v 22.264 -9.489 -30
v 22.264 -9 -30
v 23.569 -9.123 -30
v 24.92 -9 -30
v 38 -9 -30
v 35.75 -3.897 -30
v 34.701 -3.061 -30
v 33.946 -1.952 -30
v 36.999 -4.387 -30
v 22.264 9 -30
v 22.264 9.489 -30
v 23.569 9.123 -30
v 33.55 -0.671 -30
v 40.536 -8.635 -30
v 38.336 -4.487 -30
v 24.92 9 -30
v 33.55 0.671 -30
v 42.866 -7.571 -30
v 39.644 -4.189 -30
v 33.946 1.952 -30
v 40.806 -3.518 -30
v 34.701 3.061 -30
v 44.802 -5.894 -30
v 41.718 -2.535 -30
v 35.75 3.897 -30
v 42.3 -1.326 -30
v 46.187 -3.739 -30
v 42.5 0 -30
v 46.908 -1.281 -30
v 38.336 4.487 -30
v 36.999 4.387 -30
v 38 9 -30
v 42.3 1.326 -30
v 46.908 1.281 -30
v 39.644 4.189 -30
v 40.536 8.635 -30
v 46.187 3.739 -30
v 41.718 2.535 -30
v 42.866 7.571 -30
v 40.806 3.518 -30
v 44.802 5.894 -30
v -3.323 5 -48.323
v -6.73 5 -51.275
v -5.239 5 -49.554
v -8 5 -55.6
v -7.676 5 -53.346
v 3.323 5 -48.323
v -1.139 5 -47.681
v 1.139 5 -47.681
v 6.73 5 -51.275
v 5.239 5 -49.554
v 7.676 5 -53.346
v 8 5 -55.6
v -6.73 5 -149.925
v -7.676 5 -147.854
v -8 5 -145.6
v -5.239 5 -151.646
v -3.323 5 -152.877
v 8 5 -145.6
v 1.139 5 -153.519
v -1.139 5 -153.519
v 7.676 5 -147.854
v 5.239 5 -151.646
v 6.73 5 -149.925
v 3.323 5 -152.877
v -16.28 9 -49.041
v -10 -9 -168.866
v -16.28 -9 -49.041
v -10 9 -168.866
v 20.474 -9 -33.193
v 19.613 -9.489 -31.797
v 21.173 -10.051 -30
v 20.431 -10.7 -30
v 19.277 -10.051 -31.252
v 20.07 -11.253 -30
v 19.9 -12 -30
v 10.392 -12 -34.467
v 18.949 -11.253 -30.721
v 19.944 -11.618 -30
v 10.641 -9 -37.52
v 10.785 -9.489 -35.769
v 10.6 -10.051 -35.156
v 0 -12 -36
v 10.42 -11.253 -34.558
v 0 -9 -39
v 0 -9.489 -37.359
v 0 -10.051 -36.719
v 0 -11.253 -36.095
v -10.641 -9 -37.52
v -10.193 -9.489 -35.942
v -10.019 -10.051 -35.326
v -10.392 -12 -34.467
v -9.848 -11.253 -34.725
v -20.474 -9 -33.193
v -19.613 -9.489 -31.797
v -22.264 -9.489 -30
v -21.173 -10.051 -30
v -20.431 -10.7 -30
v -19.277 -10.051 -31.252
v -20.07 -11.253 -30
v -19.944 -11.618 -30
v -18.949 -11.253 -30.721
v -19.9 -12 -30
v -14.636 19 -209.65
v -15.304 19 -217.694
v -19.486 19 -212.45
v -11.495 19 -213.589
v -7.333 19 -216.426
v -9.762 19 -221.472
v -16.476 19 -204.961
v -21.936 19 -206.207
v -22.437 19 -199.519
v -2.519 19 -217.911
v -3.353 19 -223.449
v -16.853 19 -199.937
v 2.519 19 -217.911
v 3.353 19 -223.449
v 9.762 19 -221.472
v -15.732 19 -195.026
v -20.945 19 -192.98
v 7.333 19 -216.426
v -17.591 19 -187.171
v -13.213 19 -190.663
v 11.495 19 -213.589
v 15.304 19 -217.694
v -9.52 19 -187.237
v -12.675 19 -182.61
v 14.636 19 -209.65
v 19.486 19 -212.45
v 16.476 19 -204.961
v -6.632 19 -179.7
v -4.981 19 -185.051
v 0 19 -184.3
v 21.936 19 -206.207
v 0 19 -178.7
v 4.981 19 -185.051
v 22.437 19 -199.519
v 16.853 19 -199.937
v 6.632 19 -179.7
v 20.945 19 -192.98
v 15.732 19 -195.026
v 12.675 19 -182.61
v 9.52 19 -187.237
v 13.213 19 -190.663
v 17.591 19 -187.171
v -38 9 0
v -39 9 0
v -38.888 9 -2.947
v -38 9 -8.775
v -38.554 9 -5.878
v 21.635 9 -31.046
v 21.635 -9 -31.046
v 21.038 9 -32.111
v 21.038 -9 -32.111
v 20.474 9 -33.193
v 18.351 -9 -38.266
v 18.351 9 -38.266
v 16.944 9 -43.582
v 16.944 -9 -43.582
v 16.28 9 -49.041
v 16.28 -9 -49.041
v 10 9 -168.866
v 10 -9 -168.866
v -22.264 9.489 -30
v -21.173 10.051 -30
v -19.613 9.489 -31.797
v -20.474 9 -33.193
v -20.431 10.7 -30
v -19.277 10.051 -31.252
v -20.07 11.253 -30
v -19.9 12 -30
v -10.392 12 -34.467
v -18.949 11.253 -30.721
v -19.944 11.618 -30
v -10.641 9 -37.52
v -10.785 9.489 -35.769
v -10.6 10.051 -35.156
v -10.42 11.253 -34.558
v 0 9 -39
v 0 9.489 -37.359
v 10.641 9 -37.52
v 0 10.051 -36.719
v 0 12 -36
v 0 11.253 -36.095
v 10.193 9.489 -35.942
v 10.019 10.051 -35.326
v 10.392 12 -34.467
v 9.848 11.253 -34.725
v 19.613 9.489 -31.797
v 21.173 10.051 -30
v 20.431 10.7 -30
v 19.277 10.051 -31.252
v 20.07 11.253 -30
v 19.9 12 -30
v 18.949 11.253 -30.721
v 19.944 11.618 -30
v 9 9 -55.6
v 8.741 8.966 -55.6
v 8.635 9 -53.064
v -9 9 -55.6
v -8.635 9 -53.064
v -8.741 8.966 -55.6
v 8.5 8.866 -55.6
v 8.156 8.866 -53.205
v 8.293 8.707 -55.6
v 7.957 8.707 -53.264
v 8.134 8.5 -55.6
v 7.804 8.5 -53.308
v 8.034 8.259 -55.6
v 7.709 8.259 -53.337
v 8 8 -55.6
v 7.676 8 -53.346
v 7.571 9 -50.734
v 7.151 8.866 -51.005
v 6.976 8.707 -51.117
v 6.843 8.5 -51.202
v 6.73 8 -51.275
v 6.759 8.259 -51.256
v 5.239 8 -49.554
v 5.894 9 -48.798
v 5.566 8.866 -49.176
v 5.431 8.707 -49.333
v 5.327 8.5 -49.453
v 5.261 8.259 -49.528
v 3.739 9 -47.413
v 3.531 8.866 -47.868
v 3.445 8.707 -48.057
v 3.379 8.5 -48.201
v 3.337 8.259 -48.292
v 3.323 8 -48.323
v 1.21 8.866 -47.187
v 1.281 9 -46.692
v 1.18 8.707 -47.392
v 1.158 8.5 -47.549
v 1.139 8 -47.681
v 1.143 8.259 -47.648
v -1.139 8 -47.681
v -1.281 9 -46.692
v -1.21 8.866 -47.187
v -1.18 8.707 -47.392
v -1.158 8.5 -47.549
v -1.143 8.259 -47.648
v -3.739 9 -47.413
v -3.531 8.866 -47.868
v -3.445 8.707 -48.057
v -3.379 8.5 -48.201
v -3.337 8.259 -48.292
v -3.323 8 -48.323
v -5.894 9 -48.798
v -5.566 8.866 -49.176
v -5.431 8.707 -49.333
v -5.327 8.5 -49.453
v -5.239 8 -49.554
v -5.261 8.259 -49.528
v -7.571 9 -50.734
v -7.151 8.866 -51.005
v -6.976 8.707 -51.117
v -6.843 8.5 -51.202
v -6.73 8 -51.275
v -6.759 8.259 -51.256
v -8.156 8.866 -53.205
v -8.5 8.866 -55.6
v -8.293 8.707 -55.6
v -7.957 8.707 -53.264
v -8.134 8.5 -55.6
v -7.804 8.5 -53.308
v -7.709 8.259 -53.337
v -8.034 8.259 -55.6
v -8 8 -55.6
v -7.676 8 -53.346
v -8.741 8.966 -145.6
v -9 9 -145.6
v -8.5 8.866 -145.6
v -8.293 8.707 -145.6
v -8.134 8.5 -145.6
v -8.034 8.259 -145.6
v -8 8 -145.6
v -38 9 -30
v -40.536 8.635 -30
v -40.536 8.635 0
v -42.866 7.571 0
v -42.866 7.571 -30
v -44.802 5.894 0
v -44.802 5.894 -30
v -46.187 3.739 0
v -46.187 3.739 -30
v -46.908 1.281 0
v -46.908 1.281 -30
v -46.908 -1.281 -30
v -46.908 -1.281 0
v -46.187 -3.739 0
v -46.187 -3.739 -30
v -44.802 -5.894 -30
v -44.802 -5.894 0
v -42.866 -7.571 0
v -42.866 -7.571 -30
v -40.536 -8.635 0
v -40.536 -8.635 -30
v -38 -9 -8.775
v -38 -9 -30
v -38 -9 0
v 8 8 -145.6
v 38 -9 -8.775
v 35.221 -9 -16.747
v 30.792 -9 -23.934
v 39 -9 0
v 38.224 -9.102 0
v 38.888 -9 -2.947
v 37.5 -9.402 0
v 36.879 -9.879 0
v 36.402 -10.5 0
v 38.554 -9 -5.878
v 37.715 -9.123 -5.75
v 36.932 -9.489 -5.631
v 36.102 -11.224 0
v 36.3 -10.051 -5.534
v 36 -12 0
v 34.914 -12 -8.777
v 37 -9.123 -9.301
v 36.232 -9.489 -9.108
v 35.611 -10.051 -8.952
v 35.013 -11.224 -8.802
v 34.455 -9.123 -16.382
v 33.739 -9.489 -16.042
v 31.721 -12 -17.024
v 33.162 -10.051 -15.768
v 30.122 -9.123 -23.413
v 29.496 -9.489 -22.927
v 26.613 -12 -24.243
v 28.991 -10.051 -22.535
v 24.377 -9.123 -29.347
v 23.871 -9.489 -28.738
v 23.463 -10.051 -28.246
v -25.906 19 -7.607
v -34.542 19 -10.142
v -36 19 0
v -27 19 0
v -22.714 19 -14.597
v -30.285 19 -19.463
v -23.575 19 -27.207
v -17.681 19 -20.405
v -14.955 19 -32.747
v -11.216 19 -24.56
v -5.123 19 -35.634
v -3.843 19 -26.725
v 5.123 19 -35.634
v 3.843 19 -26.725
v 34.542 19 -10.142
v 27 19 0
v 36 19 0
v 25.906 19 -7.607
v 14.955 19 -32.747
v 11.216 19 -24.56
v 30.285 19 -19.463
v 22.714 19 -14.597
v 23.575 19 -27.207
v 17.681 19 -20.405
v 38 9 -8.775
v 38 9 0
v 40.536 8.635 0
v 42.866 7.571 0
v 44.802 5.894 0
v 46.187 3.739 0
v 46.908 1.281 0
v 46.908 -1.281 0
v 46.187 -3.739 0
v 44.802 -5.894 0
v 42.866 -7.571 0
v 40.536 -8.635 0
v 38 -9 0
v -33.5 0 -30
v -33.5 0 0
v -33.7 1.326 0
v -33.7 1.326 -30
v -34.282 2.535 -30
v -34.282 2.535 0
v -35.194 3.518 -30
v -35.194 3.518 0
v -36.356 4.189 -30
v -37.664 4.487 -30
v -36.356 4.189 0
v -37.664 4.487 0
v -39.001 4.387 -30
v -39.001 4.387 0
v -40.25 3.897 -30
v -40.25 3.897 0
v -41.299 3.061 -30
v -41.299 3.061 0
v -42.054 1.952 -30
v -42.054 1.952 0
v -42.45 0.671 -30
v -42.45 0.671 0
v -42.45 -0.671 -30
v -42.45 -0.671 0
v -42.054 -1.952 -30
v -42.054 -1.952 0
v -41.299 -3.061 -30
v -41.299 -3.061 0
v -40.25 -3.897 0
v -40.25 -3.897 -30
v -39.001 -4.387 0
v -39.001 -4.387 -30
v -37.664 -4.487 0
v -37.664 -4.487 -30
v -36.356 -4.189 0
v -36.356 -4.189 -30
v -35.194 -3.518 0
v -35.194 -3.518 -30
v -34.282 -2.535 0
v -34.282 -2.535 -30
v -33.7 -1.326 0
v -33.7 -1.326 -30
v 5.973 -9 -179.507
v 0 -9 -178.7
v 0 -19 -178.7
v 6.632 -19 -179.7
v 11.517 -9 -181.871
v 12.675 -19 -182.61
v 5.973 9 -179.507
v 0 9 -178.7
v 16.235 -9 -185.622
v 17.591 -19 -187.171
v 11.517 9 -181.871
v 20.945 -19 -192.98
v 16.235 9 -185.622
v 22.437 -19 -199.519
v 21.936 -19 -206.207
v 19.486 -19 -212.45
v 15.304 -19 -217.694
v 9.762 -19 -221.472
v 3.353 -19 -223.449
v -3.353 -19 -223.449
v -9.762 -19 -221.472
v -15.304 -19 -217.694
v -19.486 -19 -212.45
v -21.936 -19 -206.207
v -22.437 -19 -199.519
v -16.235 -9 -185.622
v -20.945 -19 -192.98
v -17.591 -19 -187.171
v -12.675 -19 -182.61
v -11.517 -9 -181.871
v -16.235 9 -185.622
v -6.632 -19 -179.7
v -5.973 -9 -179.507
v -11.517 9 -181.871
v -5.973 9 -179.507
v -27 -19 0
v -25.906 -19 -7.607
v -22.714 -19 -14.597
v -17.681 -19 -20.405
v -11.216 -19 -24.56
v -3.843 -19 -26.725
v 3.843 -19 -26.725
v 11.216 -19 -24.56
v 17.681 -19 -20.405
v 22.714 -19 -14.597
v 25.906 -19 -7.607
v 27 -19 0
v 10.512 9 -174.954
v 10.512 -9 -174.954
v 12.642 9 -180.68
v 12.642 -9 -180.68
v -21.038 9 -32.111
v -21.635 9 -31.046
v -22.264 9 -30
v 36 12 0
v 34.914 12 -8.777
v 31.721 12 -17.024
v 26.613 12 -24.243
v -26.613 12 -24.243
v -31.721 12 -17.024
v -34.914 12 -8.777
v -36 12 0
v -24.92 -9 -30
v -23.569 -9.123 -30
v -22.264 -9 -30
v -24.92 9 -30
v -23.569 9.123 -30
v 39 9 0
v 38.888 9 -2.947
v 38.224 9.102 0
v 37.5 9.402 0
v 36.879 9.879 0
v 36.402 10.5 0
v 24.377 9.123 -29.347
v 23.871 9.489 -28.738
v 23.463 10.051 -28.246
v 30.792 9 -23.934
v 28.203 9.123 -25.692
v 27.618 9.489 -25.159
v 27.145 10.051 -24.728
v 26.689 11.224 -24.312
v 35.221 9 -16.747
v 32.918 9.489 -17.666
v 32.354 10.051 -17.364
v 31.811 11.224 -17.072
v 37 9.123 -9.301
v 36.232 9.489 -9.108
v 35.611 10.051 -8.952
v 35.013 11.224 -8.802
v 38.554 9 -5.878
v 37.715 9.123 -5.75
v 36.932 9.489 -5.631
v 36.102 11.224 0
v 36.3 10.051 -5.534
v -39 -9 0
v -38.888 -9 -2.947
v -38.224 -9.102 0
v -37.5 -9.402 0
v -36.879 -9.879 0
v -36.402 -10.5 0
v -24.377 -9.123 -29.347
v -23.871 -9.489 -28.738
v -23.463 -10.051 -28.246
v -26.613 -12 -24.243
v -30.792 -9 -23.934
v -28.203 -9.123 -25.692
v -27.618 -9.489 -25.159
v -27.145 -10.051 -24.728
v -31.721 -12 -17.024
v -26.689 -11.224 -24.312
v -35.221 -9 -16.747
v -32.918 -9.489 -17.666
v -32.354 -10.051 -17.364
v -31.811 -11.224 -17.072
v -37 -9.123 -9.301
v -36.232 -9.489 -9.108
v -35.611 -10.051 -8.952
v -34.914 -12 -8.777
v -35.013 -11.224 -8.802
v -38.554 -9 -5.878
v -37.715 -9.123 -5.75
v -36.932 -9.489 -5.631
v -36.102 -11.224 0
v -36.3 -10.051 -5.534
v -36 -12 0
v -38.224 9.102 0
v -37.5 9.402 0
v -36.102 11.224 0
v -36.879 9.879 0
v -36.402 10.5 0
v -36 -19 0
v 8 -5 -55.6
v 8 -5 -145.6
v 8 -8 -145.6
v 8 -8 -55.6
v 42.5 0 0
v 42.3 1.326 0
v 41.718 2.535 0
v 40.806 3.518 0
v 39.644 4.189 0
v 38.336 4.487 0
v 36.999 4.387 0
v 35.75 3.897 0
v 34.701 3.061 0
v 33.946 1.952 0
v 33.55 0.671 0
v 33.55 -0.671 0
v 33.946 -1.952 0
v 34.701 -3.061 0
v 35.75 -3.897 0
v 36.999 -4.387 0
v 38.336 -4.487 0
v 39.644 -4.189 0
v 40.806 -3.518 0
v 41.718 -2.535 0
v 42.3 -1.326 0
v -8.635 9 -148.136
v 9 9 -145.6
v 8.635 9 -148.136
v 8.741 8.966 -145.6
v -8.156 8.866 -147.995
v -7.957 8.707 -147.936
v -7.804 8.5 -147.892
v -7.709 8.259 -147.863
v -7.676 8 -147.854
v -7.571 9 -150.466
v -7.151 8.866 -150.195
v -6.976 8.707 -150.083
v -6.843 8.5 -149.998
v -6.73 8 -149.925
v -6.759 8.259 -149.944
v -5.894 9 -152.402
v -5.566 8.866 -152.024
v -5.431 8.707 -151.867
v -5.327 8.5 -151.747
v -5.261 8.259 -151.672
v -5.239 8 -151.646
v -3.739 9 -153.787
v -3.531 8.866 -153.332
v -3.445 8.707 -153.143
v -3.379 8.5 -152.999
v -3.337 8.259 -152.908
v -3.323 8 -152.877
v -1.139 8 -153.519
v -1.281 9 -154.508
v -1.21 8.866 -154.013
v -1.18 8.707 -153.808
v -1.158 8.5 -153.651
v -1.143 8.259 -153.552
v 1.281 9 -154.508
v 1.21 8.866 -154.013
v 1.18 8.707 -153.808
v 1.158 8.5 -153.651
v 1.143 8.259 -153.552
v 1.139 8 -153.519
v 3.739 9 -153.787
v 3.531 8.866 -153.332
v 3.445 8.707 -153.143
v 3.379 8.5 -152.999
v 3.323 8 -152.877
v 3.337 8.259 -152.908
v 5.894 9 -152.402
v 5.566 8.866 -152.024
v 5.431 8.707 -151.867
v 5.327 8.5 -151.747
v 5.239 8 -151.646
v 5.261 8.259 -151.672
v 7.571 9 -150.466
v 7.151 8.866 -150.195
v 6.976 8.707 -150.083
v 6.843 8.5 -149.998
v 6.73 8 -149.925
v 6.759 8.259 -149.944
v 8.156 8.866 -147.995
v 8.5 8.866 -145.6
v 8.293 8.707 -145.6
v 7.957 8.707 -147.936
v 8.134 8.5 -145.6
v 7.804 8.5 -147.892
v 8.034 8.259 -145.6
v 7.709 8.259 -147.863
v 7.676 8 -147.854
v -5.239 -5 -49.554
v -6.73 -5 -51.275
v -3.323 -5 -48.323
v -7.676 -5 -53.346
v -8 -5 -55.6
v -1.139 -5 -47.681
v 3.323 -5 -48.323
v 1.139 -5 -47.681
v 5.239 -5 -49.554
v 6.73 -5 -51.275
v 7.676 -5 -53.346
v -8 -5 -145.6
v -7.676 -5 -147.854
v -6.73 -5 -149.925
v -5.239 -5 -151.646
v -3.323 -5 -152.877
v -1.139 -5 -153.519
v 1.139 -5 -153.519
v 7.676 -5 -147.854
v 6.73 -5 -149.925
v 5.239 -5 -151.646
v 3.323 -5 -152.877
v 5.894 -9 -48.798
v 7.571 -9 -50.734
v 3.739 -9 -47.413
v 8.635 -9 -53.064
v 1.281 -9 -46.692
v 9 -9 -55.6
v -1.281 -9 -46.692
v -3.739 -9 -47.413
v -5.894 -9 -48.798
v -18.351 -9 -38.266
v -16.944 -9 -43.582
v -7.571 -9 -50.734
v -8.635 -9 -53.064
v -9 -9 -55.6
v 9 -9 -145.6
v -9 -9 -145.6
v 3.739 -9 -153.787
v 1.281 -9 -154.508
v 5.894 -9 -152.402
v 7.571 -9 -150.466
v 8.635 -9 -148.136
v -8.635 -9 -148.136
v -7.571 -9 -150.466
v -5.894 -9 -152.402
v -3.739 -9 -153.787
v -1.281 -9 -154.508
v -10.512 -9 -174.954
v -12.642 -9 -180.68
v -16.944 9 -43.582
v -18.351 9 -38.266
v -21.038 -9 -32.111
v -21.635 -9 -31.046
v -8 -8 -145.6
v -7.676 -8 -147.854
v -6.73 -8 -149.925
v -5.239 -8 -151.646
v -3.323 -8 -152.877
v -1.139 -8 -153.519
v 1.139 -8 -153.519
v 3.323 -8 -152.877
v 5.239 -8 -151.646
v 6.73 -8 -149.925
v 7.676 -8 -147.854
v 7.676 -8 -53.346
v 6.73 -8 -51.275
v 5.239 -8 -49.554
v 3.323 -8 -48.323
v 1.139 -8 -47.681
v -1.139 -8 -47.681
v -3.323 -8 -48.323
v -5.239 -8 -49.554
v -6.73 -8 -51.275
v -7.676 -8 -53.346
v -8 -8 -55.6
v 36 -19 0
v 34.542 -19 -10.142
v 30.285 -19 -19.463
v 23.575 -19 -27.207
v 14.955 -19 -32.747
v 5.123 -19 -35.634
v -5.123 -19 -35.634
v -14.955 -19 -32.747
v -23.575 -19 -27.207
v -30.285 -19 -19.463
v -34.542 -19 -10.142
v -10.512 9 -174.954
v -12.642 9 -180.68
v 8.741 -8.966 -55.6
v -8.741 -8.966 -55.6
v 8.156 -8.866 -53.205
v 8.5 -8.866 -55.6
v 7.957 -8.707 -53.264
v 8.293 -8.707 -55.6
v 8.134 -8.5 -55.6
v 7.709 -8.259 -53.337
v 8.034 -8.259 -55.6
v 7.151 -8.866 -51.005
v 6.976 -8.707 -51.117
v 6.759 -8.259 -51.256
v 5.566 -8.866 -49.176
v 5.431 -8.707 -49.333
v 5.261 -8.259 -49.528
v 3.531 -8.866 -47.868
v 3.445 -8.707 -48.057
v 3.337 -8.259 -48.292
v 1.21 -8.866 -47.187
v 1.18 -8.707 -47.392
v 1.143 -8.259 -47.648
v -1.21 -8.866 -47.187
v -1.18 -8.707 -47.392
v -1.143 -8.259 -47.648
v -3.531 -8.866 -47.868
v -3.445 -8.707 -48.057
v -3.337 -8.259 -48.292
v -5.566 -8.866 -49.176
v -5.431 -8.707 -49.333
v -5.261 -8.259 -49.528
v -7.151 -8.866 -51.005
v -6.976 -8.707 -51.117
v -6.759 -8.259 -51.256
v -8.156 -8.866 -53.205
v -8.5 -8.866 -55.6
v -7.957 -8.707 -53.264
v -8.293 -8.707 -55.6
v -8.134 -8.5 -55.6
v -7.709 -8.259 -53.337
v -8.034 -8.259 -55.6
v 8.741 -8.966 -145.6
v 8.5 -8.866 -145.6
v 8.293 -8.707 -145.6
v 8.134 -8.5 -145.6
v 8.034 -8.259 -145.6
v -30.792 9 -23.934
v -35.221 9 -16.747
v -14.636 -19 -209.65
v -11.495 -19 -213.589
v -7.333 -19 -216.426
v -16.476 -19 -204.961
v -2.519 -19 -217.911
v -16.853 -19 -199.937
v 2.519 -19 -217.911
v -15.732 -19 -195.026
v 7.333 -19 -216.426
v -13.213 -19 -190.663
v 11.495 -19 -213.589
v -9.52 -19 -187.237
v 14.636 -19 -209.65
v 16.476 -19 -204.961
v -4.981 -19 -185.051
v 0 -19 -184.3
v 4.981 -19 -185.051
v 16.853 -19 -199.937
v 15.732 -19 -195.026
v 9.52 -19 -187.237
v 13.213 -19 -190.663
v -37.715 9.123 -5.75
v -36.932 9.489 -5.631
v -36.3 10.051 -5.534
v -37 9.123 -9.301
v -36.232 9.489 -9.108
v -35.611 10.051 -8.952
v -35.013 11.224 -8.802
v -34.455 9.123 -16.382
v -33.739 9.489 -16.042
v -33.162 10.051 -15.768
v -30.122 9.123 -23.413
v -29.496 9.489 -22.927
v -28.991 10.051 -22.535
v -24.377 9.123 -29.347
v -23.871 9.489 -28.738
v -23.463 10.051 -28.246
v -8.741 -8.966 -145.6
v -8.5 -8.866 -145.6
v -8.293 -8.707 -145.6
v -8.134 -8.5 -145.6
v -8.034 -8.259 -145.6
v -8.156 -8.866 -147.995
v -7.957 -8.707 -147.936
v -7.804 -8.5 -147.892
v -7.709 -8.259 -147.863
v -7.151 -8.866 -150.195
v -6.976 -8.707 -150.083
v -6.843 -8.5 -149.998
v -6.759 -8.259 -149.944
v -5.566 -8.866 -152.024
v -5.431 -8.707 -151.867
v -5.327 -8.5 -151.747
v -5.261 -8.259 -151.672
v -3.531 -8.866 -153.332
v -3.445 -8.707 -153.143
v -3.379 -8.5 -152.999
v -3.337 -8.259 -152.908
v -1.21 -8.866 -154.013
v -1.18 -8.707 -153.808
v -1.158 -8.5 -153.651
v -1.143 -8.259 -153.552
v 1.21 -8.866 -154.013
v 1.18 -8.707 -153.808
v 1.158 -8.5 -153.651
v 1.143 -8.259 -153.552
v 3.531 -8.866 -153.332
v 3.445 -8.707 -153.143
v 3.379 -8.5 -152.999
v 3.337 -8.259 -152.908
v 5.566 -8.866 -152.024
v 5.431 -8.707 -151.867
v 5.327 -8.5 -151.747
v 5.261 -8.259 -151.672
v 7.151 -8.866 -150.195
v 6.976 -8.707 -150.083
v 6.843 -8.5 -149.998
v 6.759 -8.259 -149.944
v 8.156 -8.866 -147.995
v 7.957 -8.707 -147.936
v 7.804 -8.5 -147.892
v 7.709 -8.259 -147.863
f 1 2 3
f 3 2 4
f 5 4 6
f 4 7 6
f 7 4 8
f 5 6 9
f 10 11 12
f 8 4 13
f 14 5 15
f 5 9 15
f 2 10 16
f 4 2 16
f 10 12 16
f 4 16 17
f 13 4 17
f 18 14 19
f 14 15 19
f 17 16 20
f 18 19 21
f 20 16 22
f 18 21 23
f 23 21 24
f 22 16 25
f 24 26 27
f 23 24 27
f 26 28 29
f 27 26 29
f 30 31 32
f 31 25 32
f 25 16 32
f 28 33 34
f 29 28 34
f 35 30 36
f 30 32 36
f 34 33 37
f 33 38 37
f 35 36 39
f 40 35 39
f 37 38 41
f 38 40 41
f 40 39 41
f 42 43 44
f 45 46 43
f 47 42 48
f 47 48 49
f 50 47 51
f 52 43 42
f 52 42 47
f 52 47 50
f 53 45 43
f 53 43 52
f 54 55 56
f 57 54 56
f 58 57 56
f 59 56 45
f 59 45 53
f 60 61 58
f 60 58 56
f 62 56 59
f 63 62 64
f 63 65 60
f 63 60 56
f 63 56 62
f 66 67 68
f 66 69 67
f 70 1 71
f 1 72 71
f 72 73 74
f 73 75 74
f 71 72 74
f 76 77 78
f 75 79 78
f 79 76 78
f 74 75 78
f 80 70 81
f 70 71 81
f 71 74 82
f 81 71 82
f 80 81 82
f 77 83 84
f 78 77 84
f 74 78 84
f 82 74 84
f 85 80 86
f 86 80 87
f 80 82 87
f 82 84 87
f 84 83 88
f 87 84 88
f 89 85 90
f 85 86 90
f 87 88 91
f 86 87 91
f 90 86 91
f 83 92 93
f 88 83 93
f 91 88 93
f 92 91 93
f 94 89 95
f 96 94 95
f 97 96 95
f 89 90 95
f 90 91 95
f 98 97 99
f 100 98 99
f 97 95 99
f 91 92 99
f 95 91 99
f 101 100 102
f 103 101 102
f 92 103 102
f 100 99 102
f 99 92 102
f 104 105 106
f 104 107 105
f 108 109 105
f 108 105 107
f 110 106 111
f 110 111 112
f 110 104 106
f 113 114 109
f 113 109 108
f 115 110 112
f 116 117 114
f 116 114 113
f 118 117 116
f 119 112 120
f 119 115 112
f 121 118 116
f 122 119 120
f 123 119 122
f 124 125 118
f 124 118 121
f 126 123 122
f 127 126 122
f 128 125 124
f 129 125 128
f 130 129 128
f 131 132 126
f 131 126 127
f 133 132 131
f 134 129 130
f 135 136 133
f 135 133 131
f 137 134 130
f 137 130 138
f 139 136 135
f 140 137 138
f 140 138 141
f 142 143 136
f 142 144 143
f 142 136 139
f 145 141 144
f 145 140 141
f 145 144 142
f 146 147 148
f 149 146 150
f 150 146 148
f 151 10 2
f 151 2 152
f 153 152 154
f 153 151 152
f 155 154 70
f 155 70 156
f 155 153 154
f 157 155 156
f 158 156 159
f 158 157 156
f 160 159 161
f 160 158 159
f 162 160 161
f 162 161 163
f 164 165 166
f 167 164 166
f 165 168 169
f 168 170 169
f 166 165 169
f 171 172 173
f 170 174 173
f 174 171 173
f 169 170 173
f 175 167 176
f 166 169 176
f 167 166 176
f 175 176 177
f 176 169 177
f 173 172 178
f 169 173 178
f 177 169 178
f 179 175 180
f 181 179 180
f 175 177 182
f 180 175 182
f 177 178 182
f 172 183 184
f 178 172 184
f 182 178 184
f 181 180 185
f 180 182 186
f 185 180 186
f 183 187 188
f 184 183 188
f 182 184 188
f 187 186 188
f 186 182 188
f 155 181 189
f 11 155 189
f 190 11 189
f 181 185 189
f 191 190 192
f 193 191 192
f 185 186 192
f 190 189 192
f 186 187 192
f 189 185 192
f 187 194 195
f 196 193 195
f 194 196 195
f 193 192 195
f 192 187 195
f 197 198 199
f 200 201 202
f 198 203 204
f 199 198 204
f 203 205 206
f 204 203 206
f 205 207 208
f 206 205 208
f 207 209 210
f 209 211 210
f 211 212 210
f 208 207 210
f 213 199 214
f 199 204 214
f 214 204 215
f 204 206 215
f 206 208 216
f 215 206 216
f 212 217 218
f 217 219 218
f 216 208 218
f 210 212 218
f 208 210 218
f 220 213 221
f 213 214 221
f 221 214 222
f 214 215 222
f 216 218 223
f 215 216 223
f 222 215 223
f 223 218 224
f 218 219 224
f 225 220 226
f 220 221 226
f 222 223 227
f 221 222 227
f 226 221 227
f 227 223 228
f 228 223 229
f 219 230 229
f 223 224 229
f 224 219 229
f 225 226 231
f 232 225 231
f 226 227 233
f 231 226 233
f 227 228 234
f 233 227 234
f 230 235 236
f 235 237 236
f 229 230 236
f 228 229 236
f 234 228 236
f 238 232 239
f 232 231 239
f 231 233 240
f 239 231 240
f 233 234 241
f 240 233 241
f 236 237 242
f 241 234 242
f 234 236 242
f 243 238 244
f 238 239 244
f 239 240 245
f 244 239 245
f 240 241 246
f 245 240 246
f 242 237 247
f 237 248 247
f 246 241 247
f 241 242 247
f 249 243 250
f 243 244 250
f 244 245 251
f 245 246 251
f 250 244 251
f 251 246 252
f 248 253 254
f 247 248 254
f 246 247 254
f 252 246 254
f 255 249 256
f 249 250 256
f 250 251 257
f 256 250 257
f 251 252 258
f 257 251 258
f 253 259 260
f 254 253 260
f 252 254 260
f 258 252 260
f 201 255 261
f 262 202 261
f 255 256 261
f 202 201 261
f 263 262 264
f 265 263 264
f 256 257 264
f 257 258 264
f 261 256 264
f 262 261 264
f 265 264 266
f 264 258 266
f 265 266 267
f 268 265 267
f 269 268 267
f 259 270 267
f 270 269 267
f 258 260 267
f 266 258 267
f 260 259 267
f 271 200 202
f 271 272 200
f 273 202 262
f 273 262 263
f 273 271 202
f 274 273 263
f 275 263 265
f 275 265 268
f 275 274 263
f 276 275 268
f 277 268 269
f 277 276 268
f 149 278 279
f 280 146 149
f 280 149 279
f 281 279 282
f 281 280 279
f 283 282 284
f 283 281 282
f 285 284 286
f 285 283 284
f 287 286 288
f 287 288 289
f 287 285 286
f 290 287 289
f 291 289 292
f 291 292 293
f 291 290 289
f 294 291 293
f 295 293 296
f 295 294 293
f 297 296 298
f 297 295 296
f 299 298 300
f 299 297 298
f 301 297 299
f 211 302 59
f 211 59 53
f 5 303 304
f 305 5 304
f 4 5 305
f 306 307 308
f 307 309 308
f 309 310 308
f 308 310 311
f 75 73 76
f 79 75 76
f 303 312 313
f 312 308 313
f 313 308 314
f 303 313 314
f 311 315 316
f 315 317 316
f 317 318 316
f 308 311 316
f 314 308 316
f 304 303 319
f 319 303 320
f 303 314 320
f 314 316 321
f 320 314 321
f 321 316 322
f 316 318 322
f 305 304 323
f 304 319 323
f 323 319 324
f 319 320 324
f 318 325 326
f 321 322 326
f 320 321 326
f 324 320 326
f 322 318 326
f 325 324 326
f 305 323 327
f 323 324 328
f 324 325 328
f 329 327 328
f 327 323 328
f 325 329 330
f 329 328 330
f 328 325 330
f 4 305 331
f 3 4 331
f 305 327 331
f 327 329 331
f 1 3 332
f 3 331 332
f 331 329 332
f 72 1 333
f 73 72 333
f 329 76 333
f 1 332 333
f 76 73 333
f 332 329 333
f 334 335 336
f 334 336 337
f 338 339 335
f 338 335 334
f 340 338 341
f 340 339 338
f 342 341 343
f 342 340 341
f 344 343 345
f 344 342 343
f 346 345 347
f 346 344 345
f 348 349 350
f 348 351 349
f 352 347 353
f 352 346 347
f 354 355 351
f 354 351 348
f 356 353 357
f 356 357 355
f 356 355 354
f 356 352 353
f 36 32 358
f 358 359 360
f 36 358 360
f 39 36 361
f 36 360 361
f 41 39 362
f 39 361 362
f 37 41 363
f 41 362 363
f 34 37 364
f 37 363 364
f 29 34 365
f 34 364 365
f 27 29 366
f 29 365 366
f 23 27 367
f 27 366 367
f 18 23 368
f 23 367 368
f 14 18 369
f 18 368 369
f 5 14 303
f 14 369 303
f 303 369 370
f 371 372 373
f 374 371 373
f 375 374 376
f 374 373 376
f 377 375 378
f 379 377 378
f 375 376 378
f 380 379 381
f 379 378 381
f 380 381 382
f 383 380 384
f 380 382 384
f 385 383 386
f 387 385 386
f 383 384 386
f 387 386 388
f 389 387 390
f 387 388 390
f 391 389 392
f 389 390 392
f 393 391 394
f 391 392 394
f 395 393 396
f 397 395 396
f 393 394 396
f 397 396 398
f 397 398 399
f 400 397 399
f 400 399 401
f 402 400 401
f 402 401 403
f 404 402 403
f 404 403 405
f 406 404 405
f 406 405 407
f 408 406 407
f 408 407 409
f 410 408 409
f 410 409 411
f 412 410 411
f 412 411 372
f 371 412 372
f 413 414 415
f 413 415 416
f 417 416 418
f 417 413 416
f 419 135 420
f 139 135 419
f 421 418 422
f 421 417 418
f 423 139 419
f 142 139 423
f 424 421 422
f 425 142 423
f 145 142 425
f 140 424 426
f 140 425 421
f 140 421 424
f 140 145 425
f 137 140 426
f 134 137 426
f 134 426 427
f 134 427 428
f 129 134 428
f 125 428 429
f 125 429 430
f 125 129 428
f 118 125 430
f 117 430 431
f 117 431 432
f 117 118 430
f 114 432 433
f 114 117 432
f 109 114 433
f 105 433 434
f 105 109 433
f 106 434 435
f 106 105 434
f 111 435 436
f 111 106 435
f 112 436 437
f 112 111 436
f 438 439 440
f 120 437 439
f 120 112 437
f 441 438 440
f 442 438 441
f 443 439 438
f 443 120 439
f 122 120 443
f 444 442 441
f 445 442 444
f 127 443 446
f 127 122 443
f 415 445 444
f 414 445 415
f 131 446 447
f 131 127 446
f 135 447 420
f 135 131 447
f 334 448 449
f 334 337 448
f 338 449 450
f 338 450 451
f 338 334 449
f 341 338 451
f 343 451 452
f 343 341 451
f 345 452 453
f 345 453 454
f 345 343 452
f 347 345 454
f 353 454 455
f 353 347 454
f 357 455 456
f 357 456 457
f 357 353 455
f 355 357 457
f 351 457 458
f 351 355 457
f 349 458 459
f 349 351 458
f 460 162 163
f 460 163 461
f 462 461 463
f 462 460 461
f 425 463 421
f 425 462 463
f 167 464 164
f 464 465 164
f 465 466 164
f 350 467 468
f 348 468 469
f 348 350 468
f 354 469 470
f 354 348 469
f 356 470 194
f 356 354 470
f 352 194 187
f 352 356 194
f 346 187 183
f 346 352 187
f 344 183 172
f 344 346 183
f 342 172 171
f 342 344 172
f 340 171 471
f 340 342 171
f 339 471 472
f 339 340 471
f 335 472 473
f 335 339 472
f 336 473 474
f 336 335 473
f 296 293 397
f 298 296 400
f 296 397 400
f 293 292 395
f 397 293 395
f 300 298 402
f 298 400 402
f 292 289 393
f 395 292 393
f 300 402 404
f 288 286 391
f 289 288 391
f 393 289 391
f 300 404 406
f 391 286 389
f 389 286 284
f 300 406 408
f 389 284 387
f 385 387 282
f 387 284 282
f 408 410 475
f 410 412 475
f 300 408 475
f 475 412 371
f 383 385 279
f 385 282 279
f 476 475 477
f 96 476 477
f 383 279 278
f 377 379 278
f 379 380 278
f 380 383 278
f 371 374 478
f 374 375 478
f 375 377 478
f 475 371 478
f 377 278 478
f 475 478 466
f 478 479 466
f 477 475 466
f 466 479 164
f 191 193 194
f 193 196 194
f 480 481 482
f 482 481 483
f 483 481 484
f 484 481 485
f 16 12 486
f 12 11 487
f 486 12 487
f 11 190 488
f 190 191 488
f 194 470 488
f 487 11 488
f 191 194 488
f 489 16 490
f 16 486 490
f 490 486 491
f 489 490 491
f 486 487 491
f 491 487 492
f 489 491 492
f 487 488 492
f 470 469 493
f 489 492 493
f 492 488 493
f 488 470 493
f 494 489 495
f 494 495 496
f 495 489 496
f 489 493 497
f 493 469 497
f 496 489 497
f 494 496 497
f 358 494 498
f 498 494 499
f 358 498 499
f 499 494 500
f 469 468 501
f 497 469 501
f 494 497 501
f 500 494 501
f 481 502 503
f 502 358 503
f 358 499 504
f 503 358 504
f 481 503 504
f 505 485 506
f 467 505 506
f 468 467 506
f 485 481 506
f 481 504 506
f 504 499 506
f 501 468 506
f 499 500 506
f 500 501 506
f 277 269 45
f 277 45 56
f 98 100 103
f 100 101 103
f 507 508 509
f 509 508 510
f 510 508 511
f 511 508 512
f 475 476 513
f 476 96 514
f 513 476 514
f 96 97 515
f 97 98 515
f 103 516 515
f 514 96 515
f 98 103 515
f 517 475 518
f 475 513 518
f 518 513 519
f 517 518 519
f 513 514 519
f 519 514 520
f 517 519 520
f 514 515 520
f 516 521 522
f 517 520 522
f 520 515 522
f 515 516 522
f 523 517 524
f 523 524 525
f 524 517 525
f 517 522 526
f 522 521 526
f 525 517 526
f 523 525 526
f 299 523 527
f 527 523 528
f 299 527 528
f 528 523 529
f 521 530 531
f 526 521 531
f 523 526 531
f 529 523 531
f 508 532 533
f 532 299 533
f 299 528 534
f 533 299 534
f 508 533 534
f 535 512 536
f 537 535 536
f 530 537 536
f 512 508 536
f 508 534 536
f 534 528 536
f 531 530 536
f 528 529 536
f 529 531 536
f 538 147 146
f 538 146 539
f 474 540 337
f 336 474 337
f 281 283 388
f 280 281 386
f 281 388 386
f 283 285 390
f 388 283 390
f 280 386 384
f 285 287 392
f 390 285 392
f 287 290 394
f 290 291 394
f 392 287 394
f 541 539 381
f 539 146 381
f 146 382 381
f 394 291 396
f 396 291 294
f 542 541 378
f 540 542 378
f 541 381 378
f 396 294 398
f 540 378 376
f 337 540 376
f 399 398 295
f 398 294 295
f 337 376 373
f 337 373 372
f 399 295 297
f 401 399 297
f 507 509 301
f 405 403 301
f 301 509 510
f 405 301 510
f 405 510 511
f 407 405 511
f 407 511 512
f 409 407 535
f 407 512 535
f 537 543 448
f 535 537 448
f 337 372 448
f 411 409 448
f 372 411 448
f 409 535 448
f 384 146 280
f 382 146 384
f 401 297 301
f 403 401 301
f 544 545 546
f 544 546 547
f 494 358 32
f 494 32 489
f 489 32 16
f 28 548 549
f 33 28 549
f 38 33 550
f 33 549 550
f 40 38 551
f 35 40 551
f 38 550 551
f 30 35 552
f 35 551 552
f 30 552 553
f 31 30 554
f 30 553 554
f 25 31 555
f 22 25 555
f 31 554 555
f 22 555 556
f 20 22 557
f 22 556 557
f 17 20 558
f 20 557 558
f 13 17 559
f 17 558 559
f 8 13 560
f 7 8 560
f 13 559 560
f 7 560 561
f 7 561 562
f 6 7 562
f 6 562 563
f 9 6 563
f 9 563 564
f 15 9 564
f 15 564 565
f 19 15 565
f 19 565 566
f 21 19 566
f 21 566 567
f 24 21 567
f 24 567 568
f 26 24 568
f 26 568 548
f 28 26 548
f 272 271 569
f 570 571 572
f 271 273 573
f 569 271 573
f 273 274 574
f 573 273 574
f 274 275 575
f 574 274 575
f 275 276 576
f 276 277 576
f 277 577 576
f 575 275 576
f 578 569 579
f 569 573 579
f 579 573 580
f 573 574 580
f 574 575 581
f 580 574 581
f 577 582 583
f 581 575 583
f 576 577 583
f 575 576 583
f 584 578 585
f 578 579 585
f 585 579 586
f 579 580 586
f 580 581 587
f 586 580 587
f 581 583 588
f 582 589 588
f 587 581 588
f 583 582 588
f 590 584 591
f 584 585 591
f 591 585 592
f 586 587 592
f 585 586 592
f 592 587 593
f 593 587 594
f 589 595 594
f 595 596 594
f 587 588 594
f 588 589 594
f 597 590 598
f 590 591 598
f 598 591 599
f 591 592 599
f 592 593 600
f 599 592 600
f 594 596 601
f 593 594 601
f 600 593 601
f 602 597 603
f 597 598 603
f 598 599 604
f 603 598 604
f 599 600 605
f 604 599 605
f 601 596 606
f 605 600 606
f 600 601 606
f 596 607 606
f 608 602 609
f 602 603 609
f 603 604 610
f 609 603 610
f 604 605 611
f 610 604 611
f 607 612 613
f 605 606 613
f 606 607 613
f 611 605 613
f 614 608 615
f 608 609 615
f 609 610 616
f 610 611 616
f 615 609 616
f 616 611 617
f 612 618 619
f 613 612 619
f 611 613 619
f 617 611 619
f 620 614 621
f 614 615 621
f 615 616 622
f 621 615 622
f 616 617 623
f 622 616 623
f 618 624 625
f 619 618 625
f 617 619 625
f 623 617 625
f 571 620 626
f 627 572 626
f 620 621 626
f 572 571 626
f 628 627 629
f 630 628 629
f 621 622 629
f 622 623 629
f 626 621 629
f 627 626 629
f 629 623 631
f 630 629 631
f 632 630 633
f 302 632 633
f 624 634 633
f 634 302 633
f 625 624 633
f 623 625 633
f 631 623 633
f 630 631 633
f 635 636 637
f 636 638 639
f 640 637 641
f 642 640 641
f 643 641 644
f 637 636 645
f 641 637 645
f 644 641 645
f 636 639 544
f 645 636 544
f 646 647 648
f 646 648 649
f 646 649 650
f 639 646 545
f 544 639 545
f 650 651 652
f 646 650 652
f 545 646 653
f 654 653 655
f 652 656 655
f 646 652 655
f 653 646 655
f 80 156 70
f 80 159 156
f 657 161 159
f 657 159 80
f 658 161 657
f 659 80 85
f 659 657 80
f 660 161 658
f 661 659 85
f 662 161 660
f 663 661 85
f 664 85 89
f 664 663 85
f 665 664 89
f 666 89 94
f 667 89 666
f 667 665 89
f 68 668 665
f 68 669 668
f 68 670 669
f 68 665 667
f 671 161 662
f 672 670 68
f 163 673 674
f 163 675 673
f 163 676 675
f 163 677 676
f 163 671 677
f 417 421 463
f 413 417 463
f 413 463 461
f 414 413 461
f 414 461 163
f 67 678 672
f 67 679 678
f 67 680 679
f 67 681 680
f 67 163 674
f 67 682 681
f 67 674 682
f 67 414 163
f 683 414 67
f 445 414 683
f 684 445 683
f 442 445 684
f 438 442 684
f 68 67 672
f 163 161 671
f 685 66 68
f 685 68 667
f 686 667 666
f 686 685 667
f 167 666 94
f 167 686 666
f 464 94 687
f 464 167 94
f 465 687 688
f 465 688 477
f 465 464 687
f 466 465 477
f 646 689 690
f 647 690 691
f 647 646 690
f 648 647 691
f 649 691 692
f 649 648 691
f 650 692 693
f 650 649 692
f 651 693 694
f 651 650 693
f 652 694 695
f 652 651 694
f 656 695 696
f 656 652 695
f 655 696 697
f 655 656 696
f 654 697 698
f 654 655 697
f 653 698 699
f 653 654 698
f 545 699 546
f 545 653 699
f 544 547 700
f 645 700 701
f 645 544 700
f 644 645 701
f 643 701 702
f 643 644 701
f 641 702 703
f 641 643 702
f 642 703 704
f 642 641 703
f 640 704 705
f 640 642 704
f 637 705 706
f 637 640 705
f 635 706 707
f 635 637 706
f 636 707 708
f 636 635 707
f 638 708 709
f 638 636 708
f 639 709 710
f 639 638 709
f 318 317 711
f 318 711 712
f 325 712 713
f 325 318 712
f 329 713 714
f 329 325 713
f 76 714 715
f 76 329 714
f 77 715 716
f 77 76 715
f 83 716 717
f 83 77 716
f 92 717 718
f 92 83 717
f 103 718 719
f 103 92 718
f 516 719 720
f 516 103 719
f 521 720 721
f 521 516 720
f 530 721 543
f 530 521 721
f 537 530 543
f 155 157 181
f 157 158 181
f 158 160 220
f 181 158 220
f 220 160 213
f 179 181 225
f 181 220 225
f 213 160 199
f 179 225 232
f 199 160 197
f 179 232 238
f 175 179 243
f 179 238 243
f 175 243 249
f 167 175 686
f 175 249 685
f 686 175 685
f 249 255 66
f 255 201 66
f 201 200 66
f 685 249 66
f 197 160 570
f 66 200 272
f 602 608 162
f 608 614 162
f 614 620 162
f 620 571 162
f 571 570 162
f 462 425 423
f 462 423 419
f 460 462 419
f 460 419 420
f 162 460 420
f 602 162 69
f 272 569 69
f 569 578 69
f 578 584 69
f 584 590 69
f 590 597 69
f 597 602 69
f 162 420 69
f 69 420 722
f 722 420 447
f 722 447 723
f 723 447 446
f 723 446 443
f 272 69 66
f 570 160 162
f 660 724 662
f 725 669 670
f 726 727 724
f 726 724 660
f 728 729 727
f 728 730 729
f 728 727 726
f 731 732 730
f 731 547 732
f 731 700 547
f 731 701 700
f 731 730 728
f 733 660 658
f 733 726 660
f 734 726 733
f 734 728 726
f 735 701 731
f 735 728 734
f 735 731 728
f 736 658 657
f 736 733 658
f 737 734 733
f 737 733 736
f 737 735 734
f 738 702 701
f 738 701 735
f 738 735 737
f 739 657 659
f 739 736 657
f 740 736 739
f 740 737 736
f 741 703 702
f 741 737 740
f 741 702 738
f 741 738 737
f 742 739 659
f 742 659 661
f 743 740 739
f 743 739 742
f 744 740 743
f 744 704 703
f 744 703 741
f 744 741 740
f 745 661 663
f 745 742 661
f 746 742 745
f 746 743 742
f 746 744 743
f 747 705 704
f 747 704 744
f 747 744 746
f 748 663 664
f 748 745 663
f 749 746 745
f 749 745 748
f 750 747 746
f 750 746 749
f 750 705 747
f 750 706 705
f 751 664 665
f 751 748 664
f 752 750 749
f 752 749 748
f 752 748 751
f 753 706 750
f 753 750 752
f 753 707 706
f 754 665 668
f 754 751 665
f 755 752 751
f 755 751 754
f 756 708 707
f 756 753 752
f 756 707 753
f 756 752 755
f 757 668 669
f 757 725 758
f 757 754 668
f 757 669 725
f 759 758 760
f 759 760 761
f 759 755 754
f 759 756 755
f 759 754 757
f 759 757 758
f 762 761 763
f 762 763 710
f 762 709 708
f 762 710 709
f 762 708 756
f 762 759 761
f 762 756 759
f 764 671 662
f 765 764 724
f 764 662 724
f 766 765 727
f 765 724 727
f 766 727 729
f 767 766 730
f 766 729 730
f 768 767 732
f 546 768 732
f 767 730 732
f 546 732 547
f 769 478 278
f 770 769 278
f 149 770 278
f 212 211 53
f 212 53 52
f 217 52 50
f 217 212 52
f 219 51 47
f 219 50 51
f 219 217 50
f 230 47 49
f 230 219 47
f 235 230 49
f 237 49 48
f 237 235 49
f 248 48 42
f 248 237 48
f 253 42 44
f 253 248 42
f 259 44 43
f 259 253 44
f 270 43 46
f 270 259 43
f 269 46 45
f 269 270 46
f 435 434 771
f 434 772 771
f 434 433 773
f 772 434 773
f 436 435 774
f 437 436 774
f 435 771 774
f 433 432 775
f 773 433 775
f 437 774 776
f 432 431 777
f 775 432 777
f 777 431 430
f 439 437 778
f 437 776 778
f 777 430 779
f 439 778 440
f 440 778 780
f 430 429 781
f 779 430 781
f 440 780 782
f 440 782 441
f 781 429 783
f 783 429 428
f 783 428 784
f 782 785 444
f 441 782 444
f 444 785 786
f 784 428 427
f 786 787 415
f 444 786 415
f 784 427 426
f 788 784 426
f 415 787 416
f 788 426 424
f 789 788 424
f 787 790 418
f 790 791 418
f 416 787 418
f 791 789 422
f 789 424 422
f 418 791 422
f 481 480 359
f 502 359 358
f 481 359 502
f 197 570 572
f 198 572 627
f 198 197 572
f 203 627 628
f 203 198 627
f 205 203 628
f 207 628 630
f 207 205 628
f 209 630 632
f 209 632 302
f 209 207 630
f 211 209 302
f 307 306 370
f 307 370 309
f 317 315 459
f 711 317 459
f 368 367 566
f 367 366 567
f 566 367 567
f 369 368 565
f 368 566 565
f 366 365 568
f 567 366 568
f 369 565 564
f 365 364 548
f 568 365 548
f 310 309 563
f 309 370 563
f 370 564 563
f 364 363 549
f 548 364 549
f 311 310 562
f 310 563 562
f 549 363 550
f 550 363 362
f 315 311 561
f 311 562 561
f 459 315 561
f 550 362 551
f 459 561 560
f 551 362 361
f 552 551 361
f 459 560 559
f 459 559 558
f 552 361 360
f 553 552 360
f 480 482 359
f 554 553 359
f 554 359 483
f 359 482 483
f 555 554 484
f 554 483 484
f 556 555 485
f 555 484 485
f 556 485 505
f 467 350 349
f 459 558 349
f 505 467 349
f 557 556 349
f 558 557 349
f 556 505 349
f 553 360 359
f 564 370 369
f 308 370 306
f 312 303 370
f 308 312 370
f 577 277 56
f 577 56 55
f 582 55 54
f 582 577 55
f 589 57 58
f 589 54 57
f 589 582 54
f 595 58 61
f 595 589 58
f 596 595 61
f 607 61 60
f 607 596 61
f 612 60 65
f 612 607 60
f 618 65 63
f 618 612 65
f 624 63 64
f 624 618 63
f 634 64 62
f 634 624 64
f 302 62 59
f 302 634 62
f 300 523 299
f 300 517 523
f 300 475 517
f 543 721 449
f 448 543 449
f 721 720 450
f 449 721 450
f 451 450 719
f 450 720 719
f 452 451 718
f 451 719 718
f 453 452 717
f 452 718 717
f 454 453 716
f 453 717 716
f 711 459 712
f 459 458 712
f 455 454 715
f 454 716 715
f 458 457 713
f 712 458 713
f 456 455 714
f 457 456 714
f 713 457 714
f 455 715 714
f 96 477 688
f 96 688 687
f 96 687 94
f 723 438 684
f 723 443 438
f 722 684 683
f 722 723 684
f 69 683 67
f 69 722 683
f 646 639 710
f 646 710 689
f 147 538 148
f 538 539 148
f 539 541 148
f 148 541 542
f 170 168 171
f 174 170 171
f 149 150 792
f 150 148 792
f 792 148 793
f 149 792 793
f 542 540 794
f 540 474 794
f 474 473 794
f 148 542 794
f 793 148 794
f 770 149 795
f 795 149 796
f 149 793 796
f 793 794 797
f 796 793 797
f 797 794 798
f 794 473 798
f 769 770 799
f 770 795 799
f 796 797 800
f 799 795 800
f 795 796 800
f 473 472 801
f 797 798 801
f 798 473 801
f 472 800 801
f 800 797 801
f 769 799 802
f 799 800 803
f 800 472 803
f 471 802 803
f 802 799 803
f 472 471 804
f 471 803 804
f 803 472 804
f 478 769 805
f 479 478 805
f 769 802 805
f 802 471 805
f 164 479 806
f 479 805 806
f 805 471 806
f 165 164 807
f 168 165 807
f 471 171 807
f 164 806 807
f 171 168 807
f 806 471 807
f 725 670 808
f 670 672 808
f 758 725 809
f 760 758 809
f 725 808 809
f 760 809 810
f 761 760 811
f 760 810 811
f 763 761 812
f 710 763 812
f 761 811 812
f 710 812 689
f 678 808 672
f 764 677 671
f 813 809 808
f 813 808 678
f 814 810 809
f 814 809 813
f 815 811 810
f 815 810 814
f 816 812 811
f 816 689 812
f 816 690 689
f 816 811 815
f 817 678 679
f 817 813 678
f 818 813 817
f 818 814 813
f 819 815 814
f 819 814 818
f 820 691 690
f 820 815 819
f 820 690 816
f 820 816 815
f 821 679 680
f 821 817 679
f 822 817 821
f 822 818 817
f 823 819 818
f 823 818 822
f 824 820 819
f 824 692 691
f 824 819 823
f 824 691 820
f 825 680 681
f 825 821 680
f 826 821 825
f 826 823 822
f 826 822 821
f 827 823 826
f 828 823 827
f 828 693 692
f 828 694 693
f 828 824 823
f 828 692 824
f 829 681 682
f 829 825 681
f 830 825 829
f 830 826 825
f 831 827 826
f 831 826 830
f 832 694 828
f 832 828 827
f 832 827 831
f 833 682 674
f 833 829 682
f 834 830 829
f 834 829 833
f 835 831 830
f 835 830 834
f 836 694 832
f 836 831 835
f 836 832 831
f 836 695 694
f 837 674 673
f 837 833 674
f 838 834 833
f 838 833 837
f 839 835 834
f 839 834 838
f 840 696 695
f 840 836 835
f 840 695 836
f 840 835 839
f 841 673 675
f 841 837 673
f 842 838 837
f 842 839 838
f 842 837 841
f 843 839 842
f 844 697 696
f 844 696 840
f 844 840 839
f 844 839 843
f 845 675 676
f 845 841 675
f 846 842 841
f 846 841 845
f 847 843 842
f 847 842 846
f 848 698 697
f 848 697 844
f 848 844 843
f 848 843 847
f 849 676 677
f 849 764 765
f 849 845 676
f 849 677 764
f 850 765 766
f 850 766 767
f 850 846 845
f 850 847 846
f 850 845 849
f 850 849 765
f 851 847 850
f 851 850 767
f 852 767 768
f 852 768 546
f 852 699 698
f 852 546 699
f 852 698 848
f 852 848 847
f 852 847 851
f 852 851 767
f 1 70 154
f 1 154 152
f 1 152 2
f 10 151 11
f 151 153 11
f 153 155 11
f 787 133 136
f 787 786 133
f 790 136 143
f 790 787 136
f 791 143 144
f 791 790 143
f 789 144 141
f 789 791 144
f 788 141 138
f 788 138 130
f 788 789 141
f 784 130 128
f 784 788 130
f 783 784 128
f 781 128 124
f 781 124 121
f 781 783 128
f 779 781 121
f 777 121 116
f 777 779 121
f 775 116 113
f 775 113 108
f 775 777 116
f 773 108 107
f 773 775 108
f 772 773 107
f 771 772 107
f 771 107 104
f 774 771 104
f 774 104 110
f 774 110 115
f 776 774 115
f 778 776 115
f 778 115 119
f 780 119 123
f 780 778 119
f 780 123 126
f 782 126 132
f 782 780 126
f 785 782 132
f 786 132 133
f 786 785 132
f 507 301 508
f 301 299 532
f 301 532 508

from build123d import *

# Parameters (mm, degrees)
SKETCH1_R             = 22.5
SKETCH1_R_2           = 16.9
BOSS_EXTRUDE1_DEPTH   = 19
BOSS_EXTRUDE1_2_DEPTH = 19
BOSS_EXTRUDE2_DEPTH   = 9
BOSS_EXTRUDE3_DEPTH   = 5
FILLET2_R             = 1
BOSS_EXTRUDE4_DEPTH   = 9
FILLET3_R             = 3
SKETCH5_R             = 4.5
CUT_EXTRUDE1_DEPTH    = 38


with BuildPart() as part:
    # Sketch1 → Boss-Extrude1 (new, symmetric)
    with BuildSketch(Plane(origin=(0, 0, 0), x_dir=(1, 0, 0), z_dir=(0, 1, 0))):
        with Locations(Location((0, 201.2, 0), (0, 0, 270))):
            Circle(SKETCH1_R)
        with Locations(Location((0, 201.2, 0), (0, 0, 270))):
            Circle(SKETCH1_R_2, mode=Mode.SUBTRACT)
    extrude(amount=BOSS_EXTRUDE1_DEPTH, both=True)



with BuildPart() as body_2:
    # Sketch1 → Boss-Extrude1 2 (new, symmetric)
    with BuildSketch(Plane(origin=(0, 0, 0), x_dir=(1, 0, 0), z_dir=(0, 1, 0))):
        with BuildLine():
            Line((27, 0), (36, 0))
            ThreePointArc((36, 0), (0, 36), (-36, 0))
            Line((-36, 0), (-27, 0))
            ThreePointArc((-27, 0), (0, 27), (27, 0))
        make_face()
    extrude(amount=BOSS_EXTRUDE1_2_DEPTH, both=True)


with BuildPart() as part_1:
    add(part.part)

    add(body_2.part)  # Boss-Extrude2 merges body 2
    # Sketch1<3> → Boss-Extrude2 (add, symmetric)
    with BuildSketch(Plane(origin=(0, 0, 0), x_dir=(1, 0, 0), z_dir=(0, 1, 0))):
        with BuildLine():
            ThreePointArc((-16.279722223, 49.041287854), (-19.307974883, 35.735363352), (-26.63284908, 24.221712365))
            ThreePointArc((-26.63284908, 24.221712365), (0, 36), (26.63284908, 24.221712365))
            ThreePointArc((26.63284908, 24.221712365), (19.307974883, 35.735363352), (16.279722223, 49.041287854))
            Line((16.279722223, 49.041287854), (10, 168.865525948))
            ThreePointArc((10, 168.865525948), (11.381584619, 177.889356271), (16.234582266, 185.621542482))
            ThreePointArc((16.234582266, 185.621542482), (0, 178.7), (-16.234582266, 185.621542482))
            ThreePointArc((-16.234582266, 185.621542482), (-11.381584619, 177.889356271), (-10, 168.865525948))
            Line((-10, 168.865525948), (-16.279722223, 49.041287854))
        make_face()
        with BuildLine():
            ThreePointArc((8, 55.6), (0, 47.6), (-8, 55.6))
            Line((-8, 55.6), (-8, 145.6))
            ThreePointArc((-8, 145.6), (0, 153.6), (8, 145.6))
            Line((8, 145.6), (8, 55.6))
        make_face(mode=Mode.SUBTRACT)
    extrude(amount=BOSS_EXTRUDE2_DEPTH, both=True)

    # Sketch1<4> → Boss-Extrude3 (add, symmetric)
    with BuildSketch(Plane(origin=(0, 0, 0), x_dir=(1, 0, 0), z_dir=(0, 1, 0))):
        with BuildLine():
            Line((8, 55.6), (8, 145.6))
            ThreePointArc((8, 145.6), (0, 153.6), (-8, 145.6))
            Line((-8, 145.6), (-8, 55.6))
            ThreePointArc((-8, 55.6), (0, 47.6), (8, 55.6))
        make_face()
    extrude(amount=BOSS_EXTRUDE3_DEPTH, both=True)

    # Fillet2
    fillet2_edges = [part_1.edges().sort_by_distance(p)[0] for p in [
        (0, 9, -153.6),
        (8, 9, -100.6),
        (0, 9, -47.6),
        (-8, -9, -100.6),
        (-8, 9, -100.6),
        (0, -9, -153.6),
        (0, -9, -47.6),
        (8, -9, -100.6),
    ]]
    fillet(fillet2_edges, radius=FILLET2_R)

    # Sketch3 → Boss-Extrude4 (add, symmetric)
    with BuildSketch(Plane(origin=(0, 0, 0), x_dir=(1, 0, 0), z_dir=(0, 1, 0))):
        with BuildLine():
            Line((-19.899748742, 30), (-49, 30))
            Line((-49, 30), (-49, 0))
            Line((-49, 0), (-36, 0))
            ThreePointArc((-36, 0), (-31.720584442, 17.023645986), (-19.899748742, 30))
        make_face()
        with BuildLine():
            Line((49, 30), (49, 0))
            Line((49, 0), (36, 0))
            ThreePointArc((36, 0), (31.720584442, 17.023645986), (19.899748742, 30))
            Line((19.899748742, 30), (49, 30))
        make_face()
    extrude(amount=BOSS_EXTRUDE4_DEPTH, both=True)

    # Fillet3
    # the kernel refuses this fillet: 3 mm, written as the material it adds along each edge
    with BuildSketch(Plane(origin=(0, 9, 0), x_dir=(-1, 0, 0), z_dir=(0, 0, 1))) as fillet3_piece_1_section:
        with BuildLine():
            CenterArc((36 + FILLET3_R, -FILLET3_R), FILLET3_R, 90, 90)
            Line((36, -FILLET3_R), (36, 0))
            Line((36, 0), (36 + FILLET3_R, 0))
        make_face()
    fillet3_piece_1 = revolve(axis=Axis((0, 9, 0), (0, -1, 0)), revolution_arc=180, mode=Mode.PRIVATE)
    fillet3_piece_1 = split(fillet3_piece_1, bisect_by=Plane(origin=(-34.322989988, 9.698532199, -30), z_dir=(0, 0, 1)), keep=Keep.TOP, mode=Mode.PRIVATE)
    add(fillet3_piece_1)
    with BuildSketch(Plane(origin=(0, 9, 0), x_dir=(-1, 0, 0), z_dir=(0, 0, 1))) as fillet3_piece_2_section:
        with BuildLine():
            CenterArc((36 + FILLET3_R, -FILLET3_R), FILLET3_R, 90, 90)
            Line((36, -FILLET3_R), (36, 0))
            Line((36, 0), (36 + FILLET3_R, 0))
        make_face()
    fillet3_piece_2 = revolve(axis=Axis((0, 9, 0), (0, -1, 0)), revolution_arc=180, mode=Mode.PRIVATE)
    fillet3_piece_2 = fillet3_piece_2 - Plane(origin=(56.224903613, 10.5000003, -51.134726104), x_dir=(-0.7398013633284897, 0, 0.6728253434713263), z_dir=(0, 1, 0)) * Cylinder(40, 157, mode=Mode.PRIVATE)
    fillet3_piece_2 = fillet3_piece_2 - Plane(origin=(-56.224903613, 10.5000003, -51.134726104), x_dir=(0.9986295347545738, 0, 0.05233595624294564), z_dir=(0, 1, 0)) * Cylinder(40, 157, mode=Mode.PRIVATE)
    add(fillet3_piece_2)
    with BuildSketch(Plane(origin=(0, -9, 0), x_dir=(1, 0, 0), z_dir=(0, 0, 1))) as fillet3_piece_3_section:
        with BuildLine():
            CenterArc((36 + FILLET3_R, -FILLET3_R), FILLET3_R, 90, 90)
            Line((36, -FILLET3_R), (36, 0))
            Line((36, 0), (36 + FILLET3_R, 0))
        make_face()
    fillet3_piece_3 = revolve(axis=Axis((0, -9, 0), (0, 1, 0)), revolution_arc=180, mode=Mode.PRIVATE)
    fillet3_piece_3 = split(fillet3_piece_3, bisect_by=Plane(origin=(34.322988047, -9.698532268, -30), z_dir=(0, 0, 1)), keep=Keep.TOP, mode=Mode.PRIVATE)
    add(fillet3_piece_3)
    with BuildSketch(Plane(origin=(0, -9, 0), x_dir=(1, 0, 0), z_dir=(0, 0, 1))) as fillet3_piece_4_section:
        with BuildLine():
            CenterArc((36 + FILLET3_R, -FILLET3_R), FILLET3_R, 90, 90)
            Line((36, -FILLET3_R), (36, 0))
            Line((36, 0), (36 + FILLET3_R, 0))
        make_face()
    fillet3_piece_4 = revolve(axis=Axis((0, -9, 0), (0, 1, 0)), revolution_arc=180, mode=Mode.PRIVATE)
    fillet3_piece_4 = fillet3_piece_4 - Plane(origin=(56.224903613, -10.5000003, -51.134726104), x_dir=(-0.7398013633284897, 0, 0.6728253434713263), z_dir=(0, 1, 0)) * Cylinder(40, 157, mode=Mode.PRIVATE)
    fillet3_piece_4 = fillet3_piece_4 - Plane(origin=(-56.224903613, -10.5000003, -51.134726104), x_dir=(0.9986295347545738, 0, 0.05233595624294564), z_dir=(0, 1, 0)) * Cylinder(40, 157, mode=Mode.PRIVATE)
    add(fillet3_piece_4)

    # Sketch5 → Cut-Extrude1 (cut)
    with BuildSketch(Plane.XY):
        with BuildLine():
            Line((39, -9), (49, -9))
            Line((49, -9), (49, 9))
            Line((49, 9), (39, 9))
            Line((39, 9), (38, 9))
            ThreePointArc((38, 9), (47, 0), (38, -9))
            Line((38, -9), (39, -9))
        make_face()
        with BuildLine():
            ThreePointArc((-38, 9), (-47, 0), (-38, -9))
            Line((-38, -9), (-49, -9))
            Line((-49, -9), (-49, 9))
            Line((-49, 9), (-38, 9))
        make_face()
        with Locations((38, 0)):
            Circle(SKETCH5_R)
        with Locations((-38, 0)):
            Circle(SKETCH5_R)
    extrude(amount=-CUT_EXTRUDE1_DEPTH, mode=Mode.SUBTRACT)


solid = part_1.part
